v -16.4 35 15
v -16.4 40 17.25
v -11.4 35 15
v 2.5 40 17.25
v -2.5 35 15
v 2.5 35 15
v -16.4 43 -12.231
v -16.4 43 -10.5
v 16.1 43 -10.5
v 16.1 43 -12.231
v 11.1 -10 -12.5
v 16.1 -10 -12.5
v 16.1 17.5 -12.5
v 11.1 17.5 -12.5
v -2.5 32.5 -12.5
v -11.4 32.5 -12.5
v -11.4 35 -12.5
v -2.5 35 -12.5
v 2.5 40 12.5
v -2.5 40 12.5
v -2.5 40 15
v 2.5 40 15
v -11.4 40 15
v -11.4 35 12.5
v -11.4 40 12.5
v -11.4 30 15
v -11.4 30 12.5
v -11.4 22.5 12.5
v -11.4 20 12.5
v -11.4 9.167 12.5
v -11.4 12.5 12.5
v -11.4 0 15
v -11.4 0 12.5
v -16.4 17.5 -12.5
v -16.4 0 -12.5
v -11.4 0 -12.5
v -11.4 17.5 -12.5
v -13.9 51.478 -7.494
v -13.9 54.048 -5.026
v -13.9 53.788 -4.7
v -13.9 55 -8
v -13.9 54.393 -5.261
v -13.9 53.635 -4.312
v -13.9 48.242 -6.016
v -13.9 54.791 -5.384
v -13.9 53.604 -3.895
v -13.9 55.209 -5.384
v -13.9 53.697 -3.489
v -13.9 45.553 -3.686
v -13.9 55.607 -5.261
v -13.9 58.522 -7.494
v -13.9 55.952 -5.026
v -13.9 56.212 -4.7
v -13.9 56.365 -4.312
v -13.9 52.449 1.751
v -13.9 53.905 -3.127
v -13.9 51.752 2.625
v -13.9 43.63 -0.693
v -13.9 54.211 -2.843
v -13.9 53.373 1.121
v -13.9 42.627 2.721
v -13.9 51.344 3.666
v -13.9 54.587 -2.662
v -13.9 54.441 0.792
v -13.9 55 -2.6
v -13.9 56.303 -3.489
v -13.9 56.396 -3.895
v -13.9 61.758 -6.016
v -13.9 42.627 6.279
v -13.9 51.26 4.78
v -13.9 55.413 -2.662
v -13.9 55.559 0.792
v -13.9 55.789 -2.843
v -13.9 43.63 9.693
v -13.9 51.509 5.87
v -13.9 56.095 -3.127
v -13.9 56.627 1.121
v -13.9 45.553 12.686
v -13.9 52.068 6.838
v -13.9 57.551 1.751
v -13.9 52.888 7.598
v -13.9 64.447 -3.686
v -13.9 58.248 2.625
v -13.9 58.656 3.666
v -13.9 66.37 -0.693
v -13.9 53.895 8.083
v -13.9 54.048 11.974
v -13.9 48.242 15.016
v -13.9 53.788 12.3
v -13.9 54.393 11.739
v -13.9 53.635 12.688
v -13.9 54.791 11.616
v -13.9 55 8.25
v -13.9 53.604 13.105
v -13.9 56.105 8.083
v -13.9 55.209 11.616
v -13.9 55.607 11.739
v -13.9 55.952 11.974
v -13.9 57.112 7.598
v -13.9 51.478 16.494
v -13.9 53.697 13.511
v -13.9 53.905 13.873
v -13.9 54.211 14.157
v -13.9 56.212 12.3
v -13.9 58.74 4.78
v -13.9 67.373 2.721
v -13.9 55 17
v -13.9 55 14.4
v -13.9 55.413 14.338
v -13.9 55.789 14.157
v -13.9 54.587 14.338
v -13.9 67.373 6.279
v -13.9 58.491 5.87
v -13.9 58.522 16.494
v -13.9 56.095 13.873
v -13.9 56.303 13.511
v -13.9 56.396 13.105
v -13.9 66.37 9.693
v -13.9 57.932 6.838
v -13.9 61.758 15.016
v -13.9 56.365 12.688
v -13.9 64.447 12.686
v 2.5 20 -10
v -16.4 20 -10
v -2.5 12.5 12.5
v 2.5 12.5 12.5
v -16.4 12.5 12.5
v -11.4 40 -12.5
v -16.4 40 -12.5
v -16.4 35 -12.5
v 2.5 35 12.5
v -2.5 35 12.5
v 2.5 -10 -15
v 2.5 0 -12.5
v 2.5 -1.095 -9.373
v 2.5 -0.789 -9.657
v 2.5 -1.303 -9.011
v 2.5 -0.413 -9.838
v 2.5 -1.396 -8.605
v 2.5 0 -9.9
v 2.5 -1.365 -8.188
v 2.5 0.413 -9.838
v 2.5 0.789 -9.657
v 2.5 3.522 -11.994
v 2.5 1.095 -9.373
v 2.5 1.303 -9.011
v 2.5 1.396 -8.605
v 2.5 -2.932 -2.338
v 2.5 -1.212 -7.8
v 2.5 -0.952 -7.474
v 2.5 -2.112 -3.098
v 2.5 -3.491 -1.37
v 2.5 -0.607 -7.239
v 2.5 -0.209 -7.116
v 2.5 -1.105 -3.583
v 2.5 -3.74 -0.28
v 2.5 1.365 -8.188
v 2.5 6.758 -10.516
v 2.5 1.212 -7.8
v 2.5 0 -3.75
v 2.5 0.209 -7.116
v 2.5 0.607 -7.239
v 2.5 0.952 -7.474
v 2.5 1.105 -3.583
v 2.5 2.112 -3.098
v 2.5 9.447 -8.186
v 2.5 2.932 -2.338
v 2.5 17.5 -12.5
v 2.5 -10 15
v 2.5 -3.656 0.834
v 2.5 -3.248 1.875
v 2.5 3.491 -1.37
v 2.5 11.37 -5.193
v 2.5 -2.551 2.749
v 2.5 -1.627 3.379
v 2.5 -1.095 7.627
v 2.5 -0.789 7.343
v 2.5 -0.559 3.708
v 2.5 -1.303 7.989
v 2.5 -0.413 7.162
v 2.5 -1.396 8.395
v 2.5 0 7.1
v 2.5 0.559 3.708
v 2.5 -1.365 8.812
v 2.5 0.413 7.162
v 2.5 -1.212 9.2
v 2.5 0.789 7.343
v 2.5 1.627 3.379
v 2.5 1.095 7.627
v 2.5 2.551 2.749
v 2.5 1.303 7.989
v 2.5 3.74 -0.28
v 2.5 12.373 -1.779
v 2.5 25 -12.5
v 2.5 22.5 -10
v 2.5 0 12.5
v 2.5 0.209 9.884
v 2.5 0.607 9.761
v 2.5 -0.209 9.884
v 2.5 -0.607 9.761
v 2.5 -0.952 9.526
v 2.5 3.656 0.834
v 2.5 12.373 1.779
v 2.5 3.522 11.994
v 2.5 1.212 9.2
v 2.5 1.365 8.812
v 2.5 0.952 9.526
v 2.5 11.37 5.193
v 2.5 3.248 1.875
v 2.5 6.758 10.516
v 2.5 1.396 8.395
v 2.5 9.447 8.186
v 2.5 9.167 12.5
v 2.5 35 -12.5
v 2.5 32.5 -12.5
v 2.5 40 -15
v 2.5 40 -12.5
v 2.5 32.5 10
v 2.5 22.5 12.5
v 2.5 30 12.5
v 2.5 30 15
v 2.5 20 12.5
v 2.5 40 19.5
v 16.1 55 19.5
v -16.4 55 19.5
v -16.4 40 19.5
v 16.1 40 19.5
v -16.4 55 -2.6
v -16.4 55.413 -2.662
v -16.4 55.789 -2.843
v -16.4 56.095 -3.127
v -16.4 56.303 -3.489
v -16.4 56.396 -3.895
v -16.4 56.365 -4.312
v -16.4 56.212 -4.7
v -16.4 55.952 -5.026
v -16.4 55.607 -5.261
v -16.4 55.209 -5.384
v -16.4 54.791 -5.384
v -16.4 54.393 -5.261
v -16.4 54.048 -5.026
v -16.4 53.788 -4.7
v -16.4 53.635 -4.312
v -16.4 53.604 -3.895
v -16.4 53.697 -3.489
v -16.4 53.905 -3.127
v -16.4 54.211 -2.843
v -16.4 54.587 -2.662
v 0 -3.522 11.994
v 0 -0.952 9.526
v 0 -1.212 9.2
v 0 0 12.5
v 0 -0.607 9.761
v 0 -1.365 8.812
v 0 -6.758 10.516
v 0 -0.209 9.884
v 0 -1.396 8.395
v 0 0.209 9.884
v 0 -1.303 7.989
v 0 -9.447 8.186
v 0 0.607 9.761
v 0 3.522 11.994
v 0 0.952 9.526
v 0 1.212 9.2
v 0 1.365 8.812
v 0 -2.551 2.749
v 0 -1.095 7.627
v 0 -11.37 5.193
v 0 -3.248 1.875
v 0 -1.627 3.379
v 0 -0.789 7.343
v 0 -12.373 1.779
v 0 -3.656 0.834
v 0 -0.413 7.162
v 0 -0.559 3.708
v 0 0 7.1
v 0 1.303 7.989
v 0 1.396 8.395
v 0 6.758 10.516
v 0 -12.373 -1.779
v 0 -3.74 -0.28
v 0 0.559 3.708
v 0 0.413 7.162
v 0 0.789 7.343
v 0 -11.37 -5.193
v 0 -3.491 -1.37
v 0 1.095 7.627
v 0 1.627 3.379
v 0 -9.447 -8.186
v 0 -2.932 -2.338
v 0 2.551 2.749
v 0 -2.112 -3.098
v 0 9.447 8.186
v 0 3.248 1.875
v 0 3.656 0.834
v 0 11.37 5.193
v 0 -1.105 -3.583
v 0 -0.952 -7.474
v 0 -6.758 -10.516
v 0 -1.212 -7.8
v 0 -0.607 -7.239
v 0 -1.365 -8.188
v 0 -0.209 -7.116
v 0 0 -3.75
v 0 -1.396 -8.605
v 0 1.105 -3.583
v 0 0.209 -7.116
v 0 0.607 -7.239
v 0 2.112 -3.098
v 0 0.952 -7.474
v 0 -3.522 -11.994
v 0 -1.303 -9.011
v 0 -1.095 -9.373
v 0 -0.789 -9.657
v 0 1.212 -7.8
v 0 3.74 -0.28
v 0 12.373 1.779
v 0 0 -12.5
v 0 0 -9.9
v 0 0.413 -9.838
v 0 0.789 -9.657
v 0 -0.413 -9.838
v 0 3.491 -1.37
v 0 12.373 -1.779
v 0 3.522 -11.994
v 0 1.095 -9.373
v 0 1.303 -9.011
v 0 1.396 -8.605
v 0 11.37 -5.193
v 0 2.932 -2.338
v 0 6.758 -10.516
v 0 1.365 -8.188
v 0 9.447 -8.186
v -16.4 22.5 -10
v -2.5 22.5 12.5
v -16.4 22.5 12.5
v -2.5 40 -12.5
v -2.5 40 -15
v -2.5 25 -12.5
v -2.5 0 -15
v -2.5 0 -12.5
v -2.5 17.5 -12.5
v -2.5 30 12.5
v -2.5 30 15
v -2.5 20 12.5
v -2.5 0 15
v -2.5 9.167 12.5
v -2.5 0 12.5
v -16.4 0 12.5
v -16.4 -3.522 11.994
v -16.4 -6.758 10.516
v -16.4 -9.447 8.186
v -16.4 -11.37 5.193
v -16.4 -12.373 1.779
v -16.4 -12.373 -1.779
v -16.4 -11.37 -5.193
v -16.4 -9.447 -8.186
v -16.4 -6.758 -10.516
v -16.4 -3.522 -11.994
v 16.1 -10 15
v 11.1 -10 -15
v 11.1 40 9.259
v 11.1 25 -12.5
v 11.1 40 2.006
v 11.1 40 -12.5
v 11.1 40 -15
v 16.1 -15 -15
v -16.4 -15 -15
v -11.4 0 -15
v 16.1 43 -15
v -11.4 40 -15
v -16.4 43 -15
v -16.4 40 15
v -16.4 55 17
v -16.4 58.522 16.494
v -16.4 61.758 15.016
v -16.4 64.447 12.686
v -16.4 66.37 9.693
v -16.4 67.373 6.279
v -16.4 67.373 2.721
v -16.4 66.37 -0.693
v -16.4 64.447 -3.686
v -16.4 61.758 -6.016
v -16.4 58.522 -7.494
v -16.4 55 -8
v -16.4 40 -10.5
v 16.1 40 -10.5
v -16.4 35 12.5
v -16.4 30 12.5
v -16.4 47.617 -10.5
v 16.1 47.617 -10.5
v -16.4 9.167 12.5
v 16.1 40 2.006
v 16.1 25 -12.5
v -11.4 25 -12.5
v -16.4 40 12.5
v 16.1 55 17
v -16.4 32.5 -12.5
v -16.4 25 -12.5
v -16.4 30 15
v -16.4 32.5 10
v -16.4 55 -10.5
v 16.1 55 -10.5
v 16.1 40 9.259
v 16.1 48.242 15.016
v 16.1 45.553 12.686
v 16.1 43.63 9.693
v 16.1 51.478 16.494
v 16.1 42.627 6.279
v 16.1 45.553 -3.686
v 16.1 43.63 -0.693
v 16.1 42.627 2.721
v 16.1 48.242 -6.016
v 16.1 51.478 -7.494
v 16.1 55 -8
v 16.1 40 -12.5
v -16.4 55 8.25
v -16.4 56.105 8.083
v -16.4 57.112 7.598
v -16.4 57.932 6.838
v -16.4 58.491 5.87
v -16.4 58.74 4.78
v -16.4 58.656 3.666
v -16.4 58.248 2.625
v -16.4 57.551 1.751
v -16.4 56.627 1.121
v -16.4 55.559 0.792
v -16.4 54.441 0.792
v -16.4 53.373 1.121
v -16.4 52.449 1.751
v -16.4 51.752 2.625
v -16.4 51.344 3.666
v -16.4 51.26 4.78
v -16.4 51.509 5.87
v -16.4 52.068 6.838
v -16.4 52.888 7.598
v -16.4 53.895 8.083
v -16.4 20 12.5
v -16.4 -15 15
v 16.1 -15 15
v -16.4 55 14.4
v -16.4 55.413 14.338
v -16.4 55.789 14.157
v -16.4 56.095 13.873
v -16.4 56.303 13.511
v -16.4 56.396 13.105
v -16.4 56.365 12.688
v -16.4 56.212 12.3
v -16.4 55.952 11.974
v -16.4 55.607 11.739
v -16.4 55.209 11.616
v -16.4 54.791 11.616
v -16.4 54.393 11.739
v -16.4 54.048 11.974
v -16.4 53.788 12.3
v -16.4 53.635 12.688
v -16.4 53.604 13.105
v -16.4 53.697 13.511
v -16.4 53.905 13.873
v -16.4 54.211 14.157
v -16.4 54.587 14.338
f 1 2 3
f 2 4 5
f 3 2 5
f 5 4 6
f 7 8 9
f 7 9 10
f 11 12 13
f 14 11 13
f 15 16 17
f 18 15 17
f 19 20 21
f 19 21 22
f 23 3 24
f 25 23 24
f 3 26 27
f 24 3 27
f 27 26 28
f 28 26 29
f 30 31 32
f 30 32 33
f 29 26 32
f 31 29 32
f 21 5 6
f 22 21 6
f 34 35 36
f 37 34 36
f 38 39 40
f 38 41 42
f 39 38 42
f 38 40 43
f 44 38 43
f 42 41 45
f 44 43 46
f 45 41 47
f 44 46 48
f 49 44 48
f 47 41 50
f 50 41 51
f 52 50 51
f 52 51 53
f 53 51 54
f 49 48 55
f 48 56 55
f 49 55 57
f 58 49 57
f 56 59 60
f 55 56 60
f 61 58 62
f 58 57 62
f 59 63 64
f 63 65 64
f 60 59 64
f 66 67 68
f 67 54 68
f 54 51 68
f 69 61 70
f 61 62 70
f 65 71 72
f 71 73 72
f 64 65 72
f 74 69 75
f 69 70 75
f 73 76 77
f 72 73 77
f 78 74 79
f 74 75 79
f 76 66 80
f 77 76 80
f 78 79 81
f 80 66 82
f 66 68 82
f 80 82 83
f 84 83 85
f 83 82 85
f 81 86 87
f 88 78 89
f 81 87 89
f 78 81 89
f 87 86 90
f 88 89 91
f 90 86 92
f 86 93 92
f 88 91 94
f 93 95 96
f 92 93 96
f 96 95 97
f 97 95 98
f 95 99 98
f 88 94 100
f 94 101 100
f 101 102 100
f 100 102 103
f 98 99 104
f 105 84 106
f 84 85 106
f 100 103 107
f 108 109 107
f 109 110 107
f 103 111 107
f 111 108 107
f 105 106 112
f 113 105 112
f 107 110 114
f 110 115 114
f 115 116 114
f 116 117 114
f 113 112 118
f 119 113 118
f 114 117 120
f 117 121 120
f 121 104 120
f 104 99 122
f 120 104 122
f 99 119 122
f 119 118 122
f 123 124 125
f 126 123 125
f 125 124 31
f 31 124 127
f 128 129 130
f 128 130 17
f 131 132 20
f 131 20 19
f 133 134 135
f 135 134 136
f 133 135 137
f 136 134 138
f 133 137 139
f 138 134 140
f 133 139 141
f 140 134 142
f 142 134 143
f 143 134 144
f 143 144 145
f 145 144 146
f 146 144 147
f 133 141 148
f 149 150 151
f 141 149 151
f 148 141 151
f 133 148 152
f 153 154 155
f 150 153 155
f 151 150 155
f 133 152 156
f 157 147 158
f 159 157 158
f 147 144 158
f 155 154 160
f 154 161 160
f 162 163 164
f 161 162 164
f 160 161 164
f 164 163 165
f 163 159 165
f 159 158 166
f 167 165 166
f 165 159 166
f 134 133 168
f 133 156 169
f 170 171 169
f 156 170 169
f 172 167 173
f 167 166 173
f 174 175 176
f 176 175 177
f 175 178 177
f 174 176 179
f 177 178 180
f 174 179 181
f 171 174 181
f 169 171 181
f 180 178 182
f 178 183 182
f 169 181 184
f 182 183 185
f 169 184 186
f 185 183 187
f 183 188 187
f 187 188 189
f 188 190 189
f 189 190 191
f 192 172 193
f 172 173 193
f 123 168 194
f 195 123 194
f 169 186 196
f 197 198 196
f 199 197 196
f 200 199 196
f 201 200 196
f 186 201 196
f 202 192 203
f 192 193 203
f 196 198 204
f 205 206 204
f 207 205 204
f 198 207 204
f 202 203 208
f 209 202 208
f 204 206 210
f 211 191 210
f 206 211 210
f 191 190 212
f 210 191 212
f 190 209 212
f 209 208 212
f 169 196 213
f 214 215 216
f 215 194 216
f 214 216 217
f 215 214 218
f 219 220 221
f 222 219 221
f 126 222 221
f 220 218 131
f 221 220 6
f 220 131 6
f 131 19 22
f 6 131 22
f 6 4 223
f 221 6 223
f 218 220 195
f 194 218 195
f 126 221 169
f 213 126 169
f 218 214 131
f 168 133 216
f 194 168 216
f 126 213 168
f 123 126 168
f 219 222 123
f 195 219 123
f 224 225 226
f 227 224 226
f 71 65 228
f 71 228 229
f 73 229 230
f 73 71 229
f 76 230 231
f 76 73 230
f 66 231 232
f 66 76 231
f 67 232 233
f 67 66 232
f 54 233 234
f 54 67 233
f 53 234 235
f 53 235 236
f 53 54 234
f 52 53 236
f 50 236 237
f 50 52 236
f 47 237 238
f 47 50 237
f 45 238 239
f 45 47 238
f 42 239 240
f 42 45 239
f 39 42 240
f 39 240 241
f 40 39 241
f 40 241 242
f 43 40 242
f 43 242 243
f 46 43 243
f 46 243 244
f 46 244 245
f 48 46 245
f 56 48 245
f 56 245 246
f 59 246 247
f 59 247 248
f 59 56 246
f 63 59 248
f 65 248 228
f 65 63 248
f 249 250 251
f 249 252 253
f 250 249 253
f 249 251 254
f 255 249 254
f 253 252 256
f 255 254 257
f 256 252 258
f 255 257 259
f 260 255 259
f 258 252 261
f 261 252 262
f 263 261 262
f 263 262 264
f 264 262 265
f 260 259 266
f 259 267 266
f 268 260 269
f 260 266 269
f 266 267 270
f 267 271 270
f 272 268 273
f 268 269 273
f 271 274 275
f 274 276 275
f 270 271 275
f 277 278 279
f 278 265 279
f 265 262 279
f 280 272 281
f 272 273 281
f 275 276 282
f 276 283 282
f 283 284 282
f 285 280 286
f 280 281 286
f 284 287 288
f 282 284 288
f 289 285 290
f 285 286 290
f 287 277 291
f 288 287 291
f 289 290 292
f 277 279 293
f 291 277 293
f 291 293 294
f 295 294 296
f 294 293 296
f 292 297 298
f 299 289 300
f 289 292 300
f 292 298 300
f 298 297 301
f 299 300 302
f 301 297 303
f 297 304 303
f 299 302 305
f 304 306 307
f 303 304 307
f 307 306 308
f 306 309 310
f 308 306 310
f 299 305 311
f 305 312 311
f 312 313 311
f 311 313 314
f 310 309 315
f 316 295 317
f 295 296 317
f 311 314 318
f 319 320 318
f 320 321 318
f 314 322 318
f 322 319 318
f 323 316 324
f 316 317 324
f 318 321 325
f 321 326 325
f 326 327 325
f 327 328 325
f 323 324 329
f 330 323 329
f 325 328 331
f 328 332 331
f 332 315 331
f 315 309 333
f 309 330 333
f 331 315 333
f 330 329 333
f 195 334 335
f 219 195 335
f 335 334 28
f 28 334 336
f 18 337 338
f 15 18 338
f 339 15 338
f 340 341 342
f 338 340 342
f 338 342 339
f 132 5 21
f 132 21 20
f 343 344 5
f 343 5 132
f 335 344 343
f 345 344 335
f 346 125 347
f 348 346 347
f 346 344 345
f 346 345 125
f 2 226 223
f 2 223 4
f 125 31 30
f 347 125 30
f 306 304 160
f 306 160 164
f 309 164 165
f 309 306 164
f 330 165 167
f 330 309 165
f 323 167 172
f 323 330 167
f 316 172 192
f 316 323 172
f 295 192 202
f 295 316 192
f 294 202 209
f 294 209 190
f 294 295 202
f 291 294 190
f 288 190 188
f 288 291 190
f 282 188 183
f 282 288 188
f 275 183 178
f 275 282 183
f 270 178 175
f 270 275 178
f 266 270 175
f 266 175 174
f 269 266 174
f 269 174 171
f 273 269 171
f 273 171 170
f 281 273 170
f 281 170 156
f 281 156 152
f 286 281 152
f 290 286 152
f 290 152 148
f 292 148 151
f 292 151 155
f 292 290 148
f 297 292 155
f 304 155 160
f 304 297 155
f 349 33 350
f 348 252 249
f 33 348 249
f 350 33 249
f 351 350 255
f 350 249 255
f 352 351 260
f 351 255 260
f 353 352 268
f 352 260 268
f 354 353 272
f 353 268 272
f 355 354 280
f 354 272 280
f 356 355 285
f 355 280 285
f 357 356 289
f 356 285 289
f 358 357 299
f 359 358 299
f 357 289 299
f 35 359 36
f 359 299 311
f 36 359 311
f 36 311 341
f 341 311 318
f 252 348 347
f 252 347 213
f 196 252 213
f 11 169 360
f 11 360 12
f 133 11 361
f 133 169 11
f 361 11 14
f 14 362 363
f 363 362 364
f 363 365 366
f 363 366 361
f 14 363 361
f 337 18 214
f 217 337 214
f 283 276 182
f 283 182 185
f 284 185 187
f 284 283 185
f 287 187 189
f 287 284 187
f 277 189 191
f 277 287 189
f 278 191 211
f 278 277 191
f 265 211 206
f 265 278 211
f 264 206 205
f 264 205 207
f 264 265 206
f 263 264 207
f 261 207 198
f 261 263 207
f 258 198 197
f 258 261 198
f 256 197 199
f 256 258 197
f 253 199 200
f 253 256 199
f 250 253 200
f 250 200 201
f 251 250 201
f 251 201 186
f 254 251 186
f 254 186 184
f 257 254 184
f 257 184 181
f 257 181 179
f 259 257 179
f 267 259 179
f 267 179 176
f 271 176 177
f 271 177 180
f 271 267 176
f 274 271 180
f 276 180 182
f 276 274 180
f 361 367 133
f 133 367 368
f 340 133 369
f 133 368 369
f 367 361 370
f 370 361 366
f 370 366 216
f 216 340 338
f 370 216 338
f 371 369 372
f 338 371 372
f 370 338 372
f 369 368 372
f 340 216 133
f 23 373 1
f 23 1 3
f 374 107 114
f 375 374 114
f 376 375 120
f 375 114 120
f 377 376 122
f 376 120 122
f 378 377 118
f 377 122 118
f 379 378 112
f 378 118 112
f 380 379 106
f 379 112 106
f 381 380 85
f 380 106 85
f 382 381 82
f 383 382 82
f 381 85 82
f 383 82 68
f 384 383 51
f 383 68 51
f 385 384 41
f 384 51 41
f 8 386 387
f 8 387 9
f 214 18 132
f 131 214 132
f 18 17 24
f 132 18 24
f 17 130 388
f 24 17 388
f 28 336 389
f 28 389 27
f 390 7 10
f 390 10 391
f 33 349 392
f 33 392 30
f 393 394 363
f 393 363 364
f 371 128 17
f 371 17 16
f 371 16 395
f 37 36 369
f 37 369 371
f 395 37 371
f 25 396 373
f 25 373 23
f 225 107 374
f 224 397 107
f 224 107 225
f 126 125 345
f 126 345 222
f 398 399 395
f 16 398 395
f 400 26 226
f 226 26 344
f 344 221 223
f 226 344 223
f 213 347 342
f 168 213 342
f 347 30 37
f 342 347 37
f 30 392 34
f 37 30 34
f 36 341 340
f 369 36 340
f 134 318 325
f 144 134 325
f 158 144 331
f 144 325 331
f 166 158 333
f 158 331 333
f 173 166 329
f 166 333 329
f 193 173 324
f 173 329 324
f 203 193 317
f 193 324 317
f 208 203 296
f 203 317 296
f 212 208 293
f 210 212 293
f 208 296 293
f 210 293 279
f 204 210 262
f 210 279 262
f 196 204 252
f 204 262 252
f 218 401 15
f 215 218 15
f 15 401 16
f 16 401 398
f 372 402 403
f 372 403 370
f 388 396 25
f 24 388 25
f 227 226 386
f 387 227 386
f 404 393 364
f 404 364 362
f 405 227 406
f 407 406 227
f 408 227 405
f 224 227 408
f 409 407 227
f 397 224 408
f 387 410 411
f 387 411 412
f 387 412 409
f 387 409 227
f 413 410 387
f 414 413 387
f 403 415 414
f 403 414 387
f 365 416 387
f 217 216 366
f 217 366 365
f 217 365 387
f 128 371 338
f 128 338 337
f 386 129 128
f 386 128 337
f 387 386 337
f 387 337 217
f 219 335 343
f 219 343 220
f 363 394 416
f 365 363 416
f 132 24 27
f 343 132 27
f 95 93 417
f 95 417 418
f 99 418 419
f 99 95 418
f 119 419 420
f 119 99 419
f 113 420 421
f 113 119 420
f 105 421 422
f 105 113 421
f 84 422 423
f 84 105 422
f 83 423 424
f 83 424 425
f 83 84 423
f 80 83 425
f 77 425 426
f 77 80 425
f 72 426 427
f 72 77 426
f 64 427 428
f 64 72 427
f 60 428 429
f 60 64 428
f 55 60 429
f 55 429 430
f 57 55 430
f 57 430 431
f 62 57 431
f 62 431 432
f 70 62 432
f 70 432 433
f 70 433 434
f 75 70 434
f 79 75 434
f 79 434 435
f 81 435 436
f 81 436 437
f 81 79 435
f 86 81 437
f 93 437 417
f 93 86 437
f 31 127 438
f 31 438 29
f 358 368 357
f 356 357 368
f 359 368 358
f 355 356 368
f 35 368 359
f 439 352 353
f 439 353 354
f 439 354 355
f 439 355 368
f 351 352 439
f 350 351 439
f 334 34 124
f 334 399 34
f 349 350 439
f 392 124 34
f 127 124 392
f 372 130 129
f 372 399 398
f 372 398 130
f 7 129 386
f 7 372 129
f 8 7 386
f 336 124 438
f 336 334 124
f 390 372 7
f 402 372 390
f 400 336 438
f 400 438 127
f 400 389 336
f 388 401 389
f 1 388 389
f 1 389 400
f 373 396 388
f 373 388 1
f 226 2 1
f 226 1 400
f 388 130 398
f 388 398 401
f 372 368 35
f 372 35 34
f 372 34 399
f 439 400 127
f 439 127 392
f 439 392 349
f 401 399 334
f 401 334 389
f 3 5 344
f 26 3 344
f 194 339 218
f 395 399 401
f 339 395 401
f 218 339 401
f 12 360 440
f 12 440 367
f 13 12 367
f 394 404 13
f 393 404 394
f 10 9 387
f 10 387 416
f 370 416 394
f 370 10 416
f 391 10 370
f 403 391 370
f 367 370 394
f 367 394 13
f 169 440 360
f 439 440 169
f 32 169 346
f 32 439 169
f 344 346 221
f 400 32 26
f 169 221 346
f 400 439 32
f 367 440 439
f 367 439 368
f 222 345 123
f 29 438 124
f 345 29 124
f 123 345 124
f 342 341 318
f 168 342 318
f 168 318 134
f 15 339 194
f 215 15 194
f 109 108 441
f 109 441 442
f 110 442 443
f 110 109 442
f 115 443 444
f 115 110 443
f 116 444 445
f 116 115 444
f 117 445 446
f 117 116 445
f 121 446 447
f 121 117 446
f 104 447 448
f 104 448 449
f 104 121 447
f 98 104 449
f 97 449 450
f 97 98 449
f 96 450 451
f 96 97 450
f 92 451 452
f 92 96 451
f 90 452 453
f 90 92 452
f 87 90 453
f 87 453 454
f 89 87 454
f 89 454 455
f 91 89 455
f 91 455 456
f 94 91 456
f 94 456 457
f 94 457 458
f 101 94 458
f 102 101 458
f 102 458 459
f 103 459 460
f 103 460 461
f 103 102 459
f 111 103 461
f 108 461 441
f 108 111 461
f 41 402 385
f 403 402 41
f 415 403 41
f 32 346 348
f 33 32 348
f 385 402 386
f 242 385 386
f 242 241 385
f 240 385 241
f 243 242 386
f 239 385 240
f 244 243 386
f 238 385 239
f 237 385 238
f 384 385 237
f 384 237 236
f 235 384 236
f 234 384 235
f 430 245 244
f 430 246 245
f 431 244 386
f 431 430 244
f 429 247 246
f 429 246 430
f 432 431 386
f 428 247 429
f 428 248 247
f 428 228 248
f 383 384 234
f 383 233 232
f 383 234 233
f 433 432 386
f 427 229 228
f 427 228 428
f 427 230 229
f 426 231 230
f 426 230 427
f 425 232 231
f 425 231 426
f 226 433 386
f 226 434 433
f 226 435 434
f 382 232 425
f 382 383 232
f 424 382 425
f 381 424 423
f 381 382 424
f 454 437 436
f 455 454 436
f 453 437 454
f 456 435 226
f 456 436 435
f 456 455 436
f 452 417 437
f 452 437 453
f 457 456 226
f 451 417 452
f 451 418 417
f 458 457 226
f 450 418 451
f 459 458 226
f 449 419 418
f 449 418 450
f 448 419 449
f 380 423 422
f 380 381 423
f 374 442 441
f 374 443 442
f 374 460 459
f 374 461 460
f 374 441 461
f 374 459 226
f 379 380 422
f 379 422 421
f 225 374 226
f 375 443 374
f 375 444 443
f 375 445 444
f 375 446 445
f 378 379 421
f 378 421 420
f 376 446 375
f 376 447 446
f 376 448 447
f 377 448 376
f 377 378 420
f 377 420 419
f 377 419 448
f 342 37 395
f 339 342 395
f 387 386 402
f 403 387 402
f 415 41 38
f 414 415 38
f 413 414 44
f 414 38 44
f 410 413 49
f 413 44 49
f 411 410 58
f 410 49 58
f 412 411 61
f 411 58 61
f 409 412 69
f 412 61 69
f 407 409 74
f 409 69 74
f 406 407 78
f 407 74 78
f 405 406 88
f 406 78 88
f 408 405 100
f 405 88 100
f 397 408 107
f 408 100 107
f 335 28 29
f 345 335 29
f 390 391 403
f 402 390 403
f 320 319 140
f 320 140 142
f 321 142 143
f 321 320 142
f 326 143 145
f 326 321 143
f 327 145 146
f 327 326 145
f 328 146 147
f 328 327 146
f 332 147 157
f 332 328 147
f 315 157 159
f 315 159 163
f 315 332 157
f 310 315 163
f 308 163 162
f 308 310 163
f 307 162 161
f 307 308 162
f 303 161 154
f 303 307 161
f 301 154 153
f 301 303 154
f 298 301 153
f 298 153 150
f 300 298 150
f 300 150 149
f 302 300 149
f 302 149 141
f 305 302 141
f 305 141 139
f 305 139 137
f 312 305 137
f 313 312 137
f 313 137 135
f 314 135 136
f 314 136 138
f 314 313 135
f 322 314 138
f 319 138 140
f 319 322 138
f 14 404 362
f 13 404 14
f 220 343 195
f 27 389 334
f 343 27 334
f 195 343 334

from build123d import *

# Parameters (mm, degrees)
SKETCH1_R                        = 12.5
SKETCH1_R_2                      = 3.75
SKETCH1_R_3                      = 1.4
BOSS_EXTRUDE1_DEPTH              = 2.5
BOSS_EXTRUDE12_START             = 2.5
SKETCH14_R                       = 12.5
SKETCH14_R_2                     = 3.75
SKETCH14_R_3                     = 1.4
BOSS_EXTRUDE12_DEPTH             = 2.5
BOSS_EXTRUDE13_START             = -2.5
BOSS_EXTRUDE13_DEPTH             = 18.9
BOSS_EXTRUDE14_DEPTH             = 30
BOSS_EXTRUDE14_DIRECTION_2_REACH = 73.514
SKETCH17_W                       = 5
SKETCH17_H                       = 2.5
BOSS_EXTRUDE15_DEPTH             = 40
SKETCH19_W                       = 5
SKETCH19_H                       = 2.5
BOSS_EXTRUDE16_DEPTH             = 40
BOSS_EXTRUDE17_START             = -18.9
BOSS_EXTRUDE17_DEPTH             = 32.5
BOSS_EXTRUDE19_START             = -18.9
BOSS_EXTRUDE19_DEPTH             = 18.9
BOSS_EXTRUDE20_START             = -18.9
BOSS_EXTRUDE20_DEPTH             = 18.9
SKETCH24_W                       = 30
SKETCH24_H                       = 5
BOSS_EXTRUDE21_DEPTH             = 13.6
SKETCH25_W                       = 2.5
SKETCH25_H                       = 50
BOSS_EXTRUDE22_DEPTH             = 5
BOSS_EXTRUDE23_DEPTH             = 5


# Read off the part's stored shape, not the designer's step: Boss-Extrude20
with BuildPart() as part:
    # Sketch1 → Boss-Extrude1 (new body)
    with BuildSketch(Plane(origin=(0, 0, 0), x_dir=(0, 0, -1), z_dir=(1, 0, 0))):
        Circle(SKETCH1_R)
        Circle(SKETCH1_R_2, mode=Mode.SUBTRACT)
        with Locations((8.5, 0)):
            Circle(SKETCH1_R_3, mode=Mode.SUBTRACT)
        with Locations((-8.5, 0)):
            Circle(SKETCH1_R_3, mode=Mode.SUBTRACT)
    extrude(amount=BOSS_EXTRUDE1_DEPTH)

    # Sketch15 → Boss-Extrude13 (add)
    with BuildSketch(Plane.ZY.offset(BOSS_EXTRUDE13_START)):
        with BuildLine():
            Line((-15, -15), (15, -15))
            Line((15, -15), (15, 0))
            Line((15, 0), (12.5, 0))
            ThreePointArc((12.5, 0), (0, -12.5), (-12.5, 0))
            Line((-12.5, 0), (-15, 0))
            Line((-15, 0), (-15, -15))
        make_face()
    extrude(amount=BOSS_EXTRUDE13_DEPTH)

    # Sketch17 → Boss-Extrude15 (add)
    with BuildSketch(Plane(origin=(0, 0, 0), x_dir=(1, 0, 0), z_dir=(0, 1, 0))):
        with Locations((-13.9, 13.75)):
            Rectangle(SKETCH17_W, SKETCH17_H)
        with Locations((0, 13.75)):
            Rectangle(SKETCH17_W, SKETCH17_H)
    extrude(amount=BOSS_EXTRUDE15_DEPTH)

    # Sketch19 → Boss-Extrude16 (add)
    with BuildSketch(Plane(origin=(0, 0, 0), x_dir=(1, 0, 0), z_dir=(0, 1, 0))):
        with Locations((-13.9, -13.75)):
            Rectangle(SKETCH19_W, SKETCH19_H)
        with Locations((0, -13.75)):
            Rectangle(SKETCH19_W, SKETCH19_H)
    extrude(amount=BOSS_EXTRUDE16_DEPTH)

    # Sketch20 → Boss-Extrude17 (add)
    with BuildSketch(Plane(origin=(2.5, 0, 0), x_dir=(0, 0, -1), z_dir=(1, 0, 0)).offset(BOSS_EXTRUDE17_START)):
        Polygon((15, 40), (10.5, 40), (10.5, 43), (12.23141351, 43), (10.5, 47.617102692), (10.5, 55), (15, 43), align=None)
    extrude(amount=BOSS_EXTRUDE17_DEPTH)

    # Sketch22 → Boss-Extrude19 (add)
    with BuildSketch(Plane(origin=(2.5, 0, 0), x_dir=(0, 0, -1), z_dir=(1, 0, 0)).offset(BOSS_EXTRUDE19_START)):
        Polygon((-12.5, 20), (10, 20), (-12.5, 12.5), (-12.5, 9.166666667), (12.5, 17.5), (12.5, 20), (12.5, 22.5), (12.5, 25), (-10, 32.5), (12.5, 32.5), (12.5, 35), (-12.5, 35), (-12.5, 32.5), (-12.5, 30), (10, 22.5), (-12.5, 22.5), align=None)
    extrude(amount=BOSS_EXTRUDE19_DEPTH)

    # Boss-Extrude20 outline → Boss-Extrude20 (add)
    with BuildSketch(Plane.ZY.offset(16.4).offset(BOSS_EXTRUDE20_START)):
        Polygon((15, 30), (19.5, 40), (17.25, 40), (15, 35), align=None)
    extrude(amount=BOSS_EXTRUDE20_DEPTH)

    # Sketch24 → Boss-Extrude21 (add)
    with BuildSketch(Plane(origin=(2.5, 0, 0), x_dir=(0, 0, -1), z_dir=(1, 0, 0))):
        with Locations((0, -12.5)):
            Rectangle(SKETCH24_W, SKETCH24_H)
    extrude(amount=BOSS_EXTRUDE21_DEPTH)

    # Sketch25 → Boss-Extrude22 (add)
    with BuildSketch(Plane(origin=(16.1, 0, 0), x_dir=(0, 0, -1), z_dir=(1, 0, 0))):
        with Locations((13.75, 15)):
            Rectangle(SKETCH25_W, SKETCH25_H)
    extrude(amount=-BOSS_EXTRUDE22_DEPTH)

    # Sketch26 → Boss-Extrude23 (add)
    with BuildSketch(Plane(origin=(16.1, 0, 0), x_dir=(0, 0, -1), z_dir=(1, 0, 0))):
        Polygon((-9.259125201, 40), (12.5, 17.5), (12.5, 25), (-2.006083467, 40), align=None)
    extrude(amount=-BOSS_EXTRUDE23_DEPTH)


with BuildPart() as body_2:
    # Sketch14 → Boss-Extrude12 (new body)
    with BuildSketch(Plane.ZY.offset(11.4).offset(BOSS_EXTRUDE12_START)):
        with Locations((4.5, 55)):
            Circle(SKETCH14_R)
        with Locations((4.5, 55)):
            Circle(SKETCH14_R_2, mode=Mode.SUBTRACT)
        with Locations((-4, 55)):
            Circle(SKETCH14_R_3, mode=Mode.SUBTRACT)
        with Locations((13, 55)):
            Circle(SKETCH14_R_3, mode=Mode.SUBTRACT)
    extrude(amount=BOSS_EXTRUDE12_DEPTH)

    # Sketch16 → Boss-Extrude14 (add)
    with BuildSketch(Plane(origin=(-13.9, 0, 0), x_dir=(0, 0, -1), z_dir=(1, 0, 0))):
        with BuildLine():
            Line((-17, 55), (-19.5, 55))
            Line((-19.5, 55), (-19.5, 40))
            Line((-19.5, 40), (10.5, 40))
            Line((10.5, 40), (10.5, 55))
            Line((10.5, 55), (8, 55))
            ThreePointArc((8, 55), (-4.5, 42.5), (-17, 55))
        make_face()
    extrude(amount=BOSS_EXTRUDE14_DEPTH)

    # Boss-Extrude14 direction 2: up to this face of the body (flat: up to its plane)
    boss_extrude14_direction_2_end = Plane(body_2.part.faces().sort_by_distance((-16.4, 55, -7.646446609))[0])
    # Sketch16 → Boss-Extrude14 direction 2 (add, up to the picked face)
    with BuildSketch(Plane(origin=(-13.9, 0, 0), x_dir=(0, 0, -1), z_dir=(1, 0, 0)), mode=Mode.PRIVATE) as boss_extrude14_direction_2_sk1:
        with BuildLine():
            Line((-17, 55), (-19.5, 55))
            Line((-19.5, 55), (-19.5, 40))
            Line((-19.5, 40), (10.5, 40))
            Line((10.5, 40), (10.5, 55))
            Line((10.5, 55), (8, 55))
            ThreePointArc((8, 55), (-4.5, 42.5), (-17, 55))
        make_face()
    boss_extrude14_direction_2_tool1 = split(extrude(boss_extrude14_direction_2_sk1.sketch, amount=-BOSS_EXTRUDE14_DIRECTION_2_REACH, mode=Mode.PRIVATE), bisect_by=boss_extrude14_direction_2_end, keep=Keep.BOTH, mode=Mode.PRIVATE)
    add(boss_extrude14_direction_2_tool1.solids().sort_by(Axis((-13.9, 42.16459, 4.5), (-1, 0, 0)))[0])


solid = Compound([part.part, body_2.part])
